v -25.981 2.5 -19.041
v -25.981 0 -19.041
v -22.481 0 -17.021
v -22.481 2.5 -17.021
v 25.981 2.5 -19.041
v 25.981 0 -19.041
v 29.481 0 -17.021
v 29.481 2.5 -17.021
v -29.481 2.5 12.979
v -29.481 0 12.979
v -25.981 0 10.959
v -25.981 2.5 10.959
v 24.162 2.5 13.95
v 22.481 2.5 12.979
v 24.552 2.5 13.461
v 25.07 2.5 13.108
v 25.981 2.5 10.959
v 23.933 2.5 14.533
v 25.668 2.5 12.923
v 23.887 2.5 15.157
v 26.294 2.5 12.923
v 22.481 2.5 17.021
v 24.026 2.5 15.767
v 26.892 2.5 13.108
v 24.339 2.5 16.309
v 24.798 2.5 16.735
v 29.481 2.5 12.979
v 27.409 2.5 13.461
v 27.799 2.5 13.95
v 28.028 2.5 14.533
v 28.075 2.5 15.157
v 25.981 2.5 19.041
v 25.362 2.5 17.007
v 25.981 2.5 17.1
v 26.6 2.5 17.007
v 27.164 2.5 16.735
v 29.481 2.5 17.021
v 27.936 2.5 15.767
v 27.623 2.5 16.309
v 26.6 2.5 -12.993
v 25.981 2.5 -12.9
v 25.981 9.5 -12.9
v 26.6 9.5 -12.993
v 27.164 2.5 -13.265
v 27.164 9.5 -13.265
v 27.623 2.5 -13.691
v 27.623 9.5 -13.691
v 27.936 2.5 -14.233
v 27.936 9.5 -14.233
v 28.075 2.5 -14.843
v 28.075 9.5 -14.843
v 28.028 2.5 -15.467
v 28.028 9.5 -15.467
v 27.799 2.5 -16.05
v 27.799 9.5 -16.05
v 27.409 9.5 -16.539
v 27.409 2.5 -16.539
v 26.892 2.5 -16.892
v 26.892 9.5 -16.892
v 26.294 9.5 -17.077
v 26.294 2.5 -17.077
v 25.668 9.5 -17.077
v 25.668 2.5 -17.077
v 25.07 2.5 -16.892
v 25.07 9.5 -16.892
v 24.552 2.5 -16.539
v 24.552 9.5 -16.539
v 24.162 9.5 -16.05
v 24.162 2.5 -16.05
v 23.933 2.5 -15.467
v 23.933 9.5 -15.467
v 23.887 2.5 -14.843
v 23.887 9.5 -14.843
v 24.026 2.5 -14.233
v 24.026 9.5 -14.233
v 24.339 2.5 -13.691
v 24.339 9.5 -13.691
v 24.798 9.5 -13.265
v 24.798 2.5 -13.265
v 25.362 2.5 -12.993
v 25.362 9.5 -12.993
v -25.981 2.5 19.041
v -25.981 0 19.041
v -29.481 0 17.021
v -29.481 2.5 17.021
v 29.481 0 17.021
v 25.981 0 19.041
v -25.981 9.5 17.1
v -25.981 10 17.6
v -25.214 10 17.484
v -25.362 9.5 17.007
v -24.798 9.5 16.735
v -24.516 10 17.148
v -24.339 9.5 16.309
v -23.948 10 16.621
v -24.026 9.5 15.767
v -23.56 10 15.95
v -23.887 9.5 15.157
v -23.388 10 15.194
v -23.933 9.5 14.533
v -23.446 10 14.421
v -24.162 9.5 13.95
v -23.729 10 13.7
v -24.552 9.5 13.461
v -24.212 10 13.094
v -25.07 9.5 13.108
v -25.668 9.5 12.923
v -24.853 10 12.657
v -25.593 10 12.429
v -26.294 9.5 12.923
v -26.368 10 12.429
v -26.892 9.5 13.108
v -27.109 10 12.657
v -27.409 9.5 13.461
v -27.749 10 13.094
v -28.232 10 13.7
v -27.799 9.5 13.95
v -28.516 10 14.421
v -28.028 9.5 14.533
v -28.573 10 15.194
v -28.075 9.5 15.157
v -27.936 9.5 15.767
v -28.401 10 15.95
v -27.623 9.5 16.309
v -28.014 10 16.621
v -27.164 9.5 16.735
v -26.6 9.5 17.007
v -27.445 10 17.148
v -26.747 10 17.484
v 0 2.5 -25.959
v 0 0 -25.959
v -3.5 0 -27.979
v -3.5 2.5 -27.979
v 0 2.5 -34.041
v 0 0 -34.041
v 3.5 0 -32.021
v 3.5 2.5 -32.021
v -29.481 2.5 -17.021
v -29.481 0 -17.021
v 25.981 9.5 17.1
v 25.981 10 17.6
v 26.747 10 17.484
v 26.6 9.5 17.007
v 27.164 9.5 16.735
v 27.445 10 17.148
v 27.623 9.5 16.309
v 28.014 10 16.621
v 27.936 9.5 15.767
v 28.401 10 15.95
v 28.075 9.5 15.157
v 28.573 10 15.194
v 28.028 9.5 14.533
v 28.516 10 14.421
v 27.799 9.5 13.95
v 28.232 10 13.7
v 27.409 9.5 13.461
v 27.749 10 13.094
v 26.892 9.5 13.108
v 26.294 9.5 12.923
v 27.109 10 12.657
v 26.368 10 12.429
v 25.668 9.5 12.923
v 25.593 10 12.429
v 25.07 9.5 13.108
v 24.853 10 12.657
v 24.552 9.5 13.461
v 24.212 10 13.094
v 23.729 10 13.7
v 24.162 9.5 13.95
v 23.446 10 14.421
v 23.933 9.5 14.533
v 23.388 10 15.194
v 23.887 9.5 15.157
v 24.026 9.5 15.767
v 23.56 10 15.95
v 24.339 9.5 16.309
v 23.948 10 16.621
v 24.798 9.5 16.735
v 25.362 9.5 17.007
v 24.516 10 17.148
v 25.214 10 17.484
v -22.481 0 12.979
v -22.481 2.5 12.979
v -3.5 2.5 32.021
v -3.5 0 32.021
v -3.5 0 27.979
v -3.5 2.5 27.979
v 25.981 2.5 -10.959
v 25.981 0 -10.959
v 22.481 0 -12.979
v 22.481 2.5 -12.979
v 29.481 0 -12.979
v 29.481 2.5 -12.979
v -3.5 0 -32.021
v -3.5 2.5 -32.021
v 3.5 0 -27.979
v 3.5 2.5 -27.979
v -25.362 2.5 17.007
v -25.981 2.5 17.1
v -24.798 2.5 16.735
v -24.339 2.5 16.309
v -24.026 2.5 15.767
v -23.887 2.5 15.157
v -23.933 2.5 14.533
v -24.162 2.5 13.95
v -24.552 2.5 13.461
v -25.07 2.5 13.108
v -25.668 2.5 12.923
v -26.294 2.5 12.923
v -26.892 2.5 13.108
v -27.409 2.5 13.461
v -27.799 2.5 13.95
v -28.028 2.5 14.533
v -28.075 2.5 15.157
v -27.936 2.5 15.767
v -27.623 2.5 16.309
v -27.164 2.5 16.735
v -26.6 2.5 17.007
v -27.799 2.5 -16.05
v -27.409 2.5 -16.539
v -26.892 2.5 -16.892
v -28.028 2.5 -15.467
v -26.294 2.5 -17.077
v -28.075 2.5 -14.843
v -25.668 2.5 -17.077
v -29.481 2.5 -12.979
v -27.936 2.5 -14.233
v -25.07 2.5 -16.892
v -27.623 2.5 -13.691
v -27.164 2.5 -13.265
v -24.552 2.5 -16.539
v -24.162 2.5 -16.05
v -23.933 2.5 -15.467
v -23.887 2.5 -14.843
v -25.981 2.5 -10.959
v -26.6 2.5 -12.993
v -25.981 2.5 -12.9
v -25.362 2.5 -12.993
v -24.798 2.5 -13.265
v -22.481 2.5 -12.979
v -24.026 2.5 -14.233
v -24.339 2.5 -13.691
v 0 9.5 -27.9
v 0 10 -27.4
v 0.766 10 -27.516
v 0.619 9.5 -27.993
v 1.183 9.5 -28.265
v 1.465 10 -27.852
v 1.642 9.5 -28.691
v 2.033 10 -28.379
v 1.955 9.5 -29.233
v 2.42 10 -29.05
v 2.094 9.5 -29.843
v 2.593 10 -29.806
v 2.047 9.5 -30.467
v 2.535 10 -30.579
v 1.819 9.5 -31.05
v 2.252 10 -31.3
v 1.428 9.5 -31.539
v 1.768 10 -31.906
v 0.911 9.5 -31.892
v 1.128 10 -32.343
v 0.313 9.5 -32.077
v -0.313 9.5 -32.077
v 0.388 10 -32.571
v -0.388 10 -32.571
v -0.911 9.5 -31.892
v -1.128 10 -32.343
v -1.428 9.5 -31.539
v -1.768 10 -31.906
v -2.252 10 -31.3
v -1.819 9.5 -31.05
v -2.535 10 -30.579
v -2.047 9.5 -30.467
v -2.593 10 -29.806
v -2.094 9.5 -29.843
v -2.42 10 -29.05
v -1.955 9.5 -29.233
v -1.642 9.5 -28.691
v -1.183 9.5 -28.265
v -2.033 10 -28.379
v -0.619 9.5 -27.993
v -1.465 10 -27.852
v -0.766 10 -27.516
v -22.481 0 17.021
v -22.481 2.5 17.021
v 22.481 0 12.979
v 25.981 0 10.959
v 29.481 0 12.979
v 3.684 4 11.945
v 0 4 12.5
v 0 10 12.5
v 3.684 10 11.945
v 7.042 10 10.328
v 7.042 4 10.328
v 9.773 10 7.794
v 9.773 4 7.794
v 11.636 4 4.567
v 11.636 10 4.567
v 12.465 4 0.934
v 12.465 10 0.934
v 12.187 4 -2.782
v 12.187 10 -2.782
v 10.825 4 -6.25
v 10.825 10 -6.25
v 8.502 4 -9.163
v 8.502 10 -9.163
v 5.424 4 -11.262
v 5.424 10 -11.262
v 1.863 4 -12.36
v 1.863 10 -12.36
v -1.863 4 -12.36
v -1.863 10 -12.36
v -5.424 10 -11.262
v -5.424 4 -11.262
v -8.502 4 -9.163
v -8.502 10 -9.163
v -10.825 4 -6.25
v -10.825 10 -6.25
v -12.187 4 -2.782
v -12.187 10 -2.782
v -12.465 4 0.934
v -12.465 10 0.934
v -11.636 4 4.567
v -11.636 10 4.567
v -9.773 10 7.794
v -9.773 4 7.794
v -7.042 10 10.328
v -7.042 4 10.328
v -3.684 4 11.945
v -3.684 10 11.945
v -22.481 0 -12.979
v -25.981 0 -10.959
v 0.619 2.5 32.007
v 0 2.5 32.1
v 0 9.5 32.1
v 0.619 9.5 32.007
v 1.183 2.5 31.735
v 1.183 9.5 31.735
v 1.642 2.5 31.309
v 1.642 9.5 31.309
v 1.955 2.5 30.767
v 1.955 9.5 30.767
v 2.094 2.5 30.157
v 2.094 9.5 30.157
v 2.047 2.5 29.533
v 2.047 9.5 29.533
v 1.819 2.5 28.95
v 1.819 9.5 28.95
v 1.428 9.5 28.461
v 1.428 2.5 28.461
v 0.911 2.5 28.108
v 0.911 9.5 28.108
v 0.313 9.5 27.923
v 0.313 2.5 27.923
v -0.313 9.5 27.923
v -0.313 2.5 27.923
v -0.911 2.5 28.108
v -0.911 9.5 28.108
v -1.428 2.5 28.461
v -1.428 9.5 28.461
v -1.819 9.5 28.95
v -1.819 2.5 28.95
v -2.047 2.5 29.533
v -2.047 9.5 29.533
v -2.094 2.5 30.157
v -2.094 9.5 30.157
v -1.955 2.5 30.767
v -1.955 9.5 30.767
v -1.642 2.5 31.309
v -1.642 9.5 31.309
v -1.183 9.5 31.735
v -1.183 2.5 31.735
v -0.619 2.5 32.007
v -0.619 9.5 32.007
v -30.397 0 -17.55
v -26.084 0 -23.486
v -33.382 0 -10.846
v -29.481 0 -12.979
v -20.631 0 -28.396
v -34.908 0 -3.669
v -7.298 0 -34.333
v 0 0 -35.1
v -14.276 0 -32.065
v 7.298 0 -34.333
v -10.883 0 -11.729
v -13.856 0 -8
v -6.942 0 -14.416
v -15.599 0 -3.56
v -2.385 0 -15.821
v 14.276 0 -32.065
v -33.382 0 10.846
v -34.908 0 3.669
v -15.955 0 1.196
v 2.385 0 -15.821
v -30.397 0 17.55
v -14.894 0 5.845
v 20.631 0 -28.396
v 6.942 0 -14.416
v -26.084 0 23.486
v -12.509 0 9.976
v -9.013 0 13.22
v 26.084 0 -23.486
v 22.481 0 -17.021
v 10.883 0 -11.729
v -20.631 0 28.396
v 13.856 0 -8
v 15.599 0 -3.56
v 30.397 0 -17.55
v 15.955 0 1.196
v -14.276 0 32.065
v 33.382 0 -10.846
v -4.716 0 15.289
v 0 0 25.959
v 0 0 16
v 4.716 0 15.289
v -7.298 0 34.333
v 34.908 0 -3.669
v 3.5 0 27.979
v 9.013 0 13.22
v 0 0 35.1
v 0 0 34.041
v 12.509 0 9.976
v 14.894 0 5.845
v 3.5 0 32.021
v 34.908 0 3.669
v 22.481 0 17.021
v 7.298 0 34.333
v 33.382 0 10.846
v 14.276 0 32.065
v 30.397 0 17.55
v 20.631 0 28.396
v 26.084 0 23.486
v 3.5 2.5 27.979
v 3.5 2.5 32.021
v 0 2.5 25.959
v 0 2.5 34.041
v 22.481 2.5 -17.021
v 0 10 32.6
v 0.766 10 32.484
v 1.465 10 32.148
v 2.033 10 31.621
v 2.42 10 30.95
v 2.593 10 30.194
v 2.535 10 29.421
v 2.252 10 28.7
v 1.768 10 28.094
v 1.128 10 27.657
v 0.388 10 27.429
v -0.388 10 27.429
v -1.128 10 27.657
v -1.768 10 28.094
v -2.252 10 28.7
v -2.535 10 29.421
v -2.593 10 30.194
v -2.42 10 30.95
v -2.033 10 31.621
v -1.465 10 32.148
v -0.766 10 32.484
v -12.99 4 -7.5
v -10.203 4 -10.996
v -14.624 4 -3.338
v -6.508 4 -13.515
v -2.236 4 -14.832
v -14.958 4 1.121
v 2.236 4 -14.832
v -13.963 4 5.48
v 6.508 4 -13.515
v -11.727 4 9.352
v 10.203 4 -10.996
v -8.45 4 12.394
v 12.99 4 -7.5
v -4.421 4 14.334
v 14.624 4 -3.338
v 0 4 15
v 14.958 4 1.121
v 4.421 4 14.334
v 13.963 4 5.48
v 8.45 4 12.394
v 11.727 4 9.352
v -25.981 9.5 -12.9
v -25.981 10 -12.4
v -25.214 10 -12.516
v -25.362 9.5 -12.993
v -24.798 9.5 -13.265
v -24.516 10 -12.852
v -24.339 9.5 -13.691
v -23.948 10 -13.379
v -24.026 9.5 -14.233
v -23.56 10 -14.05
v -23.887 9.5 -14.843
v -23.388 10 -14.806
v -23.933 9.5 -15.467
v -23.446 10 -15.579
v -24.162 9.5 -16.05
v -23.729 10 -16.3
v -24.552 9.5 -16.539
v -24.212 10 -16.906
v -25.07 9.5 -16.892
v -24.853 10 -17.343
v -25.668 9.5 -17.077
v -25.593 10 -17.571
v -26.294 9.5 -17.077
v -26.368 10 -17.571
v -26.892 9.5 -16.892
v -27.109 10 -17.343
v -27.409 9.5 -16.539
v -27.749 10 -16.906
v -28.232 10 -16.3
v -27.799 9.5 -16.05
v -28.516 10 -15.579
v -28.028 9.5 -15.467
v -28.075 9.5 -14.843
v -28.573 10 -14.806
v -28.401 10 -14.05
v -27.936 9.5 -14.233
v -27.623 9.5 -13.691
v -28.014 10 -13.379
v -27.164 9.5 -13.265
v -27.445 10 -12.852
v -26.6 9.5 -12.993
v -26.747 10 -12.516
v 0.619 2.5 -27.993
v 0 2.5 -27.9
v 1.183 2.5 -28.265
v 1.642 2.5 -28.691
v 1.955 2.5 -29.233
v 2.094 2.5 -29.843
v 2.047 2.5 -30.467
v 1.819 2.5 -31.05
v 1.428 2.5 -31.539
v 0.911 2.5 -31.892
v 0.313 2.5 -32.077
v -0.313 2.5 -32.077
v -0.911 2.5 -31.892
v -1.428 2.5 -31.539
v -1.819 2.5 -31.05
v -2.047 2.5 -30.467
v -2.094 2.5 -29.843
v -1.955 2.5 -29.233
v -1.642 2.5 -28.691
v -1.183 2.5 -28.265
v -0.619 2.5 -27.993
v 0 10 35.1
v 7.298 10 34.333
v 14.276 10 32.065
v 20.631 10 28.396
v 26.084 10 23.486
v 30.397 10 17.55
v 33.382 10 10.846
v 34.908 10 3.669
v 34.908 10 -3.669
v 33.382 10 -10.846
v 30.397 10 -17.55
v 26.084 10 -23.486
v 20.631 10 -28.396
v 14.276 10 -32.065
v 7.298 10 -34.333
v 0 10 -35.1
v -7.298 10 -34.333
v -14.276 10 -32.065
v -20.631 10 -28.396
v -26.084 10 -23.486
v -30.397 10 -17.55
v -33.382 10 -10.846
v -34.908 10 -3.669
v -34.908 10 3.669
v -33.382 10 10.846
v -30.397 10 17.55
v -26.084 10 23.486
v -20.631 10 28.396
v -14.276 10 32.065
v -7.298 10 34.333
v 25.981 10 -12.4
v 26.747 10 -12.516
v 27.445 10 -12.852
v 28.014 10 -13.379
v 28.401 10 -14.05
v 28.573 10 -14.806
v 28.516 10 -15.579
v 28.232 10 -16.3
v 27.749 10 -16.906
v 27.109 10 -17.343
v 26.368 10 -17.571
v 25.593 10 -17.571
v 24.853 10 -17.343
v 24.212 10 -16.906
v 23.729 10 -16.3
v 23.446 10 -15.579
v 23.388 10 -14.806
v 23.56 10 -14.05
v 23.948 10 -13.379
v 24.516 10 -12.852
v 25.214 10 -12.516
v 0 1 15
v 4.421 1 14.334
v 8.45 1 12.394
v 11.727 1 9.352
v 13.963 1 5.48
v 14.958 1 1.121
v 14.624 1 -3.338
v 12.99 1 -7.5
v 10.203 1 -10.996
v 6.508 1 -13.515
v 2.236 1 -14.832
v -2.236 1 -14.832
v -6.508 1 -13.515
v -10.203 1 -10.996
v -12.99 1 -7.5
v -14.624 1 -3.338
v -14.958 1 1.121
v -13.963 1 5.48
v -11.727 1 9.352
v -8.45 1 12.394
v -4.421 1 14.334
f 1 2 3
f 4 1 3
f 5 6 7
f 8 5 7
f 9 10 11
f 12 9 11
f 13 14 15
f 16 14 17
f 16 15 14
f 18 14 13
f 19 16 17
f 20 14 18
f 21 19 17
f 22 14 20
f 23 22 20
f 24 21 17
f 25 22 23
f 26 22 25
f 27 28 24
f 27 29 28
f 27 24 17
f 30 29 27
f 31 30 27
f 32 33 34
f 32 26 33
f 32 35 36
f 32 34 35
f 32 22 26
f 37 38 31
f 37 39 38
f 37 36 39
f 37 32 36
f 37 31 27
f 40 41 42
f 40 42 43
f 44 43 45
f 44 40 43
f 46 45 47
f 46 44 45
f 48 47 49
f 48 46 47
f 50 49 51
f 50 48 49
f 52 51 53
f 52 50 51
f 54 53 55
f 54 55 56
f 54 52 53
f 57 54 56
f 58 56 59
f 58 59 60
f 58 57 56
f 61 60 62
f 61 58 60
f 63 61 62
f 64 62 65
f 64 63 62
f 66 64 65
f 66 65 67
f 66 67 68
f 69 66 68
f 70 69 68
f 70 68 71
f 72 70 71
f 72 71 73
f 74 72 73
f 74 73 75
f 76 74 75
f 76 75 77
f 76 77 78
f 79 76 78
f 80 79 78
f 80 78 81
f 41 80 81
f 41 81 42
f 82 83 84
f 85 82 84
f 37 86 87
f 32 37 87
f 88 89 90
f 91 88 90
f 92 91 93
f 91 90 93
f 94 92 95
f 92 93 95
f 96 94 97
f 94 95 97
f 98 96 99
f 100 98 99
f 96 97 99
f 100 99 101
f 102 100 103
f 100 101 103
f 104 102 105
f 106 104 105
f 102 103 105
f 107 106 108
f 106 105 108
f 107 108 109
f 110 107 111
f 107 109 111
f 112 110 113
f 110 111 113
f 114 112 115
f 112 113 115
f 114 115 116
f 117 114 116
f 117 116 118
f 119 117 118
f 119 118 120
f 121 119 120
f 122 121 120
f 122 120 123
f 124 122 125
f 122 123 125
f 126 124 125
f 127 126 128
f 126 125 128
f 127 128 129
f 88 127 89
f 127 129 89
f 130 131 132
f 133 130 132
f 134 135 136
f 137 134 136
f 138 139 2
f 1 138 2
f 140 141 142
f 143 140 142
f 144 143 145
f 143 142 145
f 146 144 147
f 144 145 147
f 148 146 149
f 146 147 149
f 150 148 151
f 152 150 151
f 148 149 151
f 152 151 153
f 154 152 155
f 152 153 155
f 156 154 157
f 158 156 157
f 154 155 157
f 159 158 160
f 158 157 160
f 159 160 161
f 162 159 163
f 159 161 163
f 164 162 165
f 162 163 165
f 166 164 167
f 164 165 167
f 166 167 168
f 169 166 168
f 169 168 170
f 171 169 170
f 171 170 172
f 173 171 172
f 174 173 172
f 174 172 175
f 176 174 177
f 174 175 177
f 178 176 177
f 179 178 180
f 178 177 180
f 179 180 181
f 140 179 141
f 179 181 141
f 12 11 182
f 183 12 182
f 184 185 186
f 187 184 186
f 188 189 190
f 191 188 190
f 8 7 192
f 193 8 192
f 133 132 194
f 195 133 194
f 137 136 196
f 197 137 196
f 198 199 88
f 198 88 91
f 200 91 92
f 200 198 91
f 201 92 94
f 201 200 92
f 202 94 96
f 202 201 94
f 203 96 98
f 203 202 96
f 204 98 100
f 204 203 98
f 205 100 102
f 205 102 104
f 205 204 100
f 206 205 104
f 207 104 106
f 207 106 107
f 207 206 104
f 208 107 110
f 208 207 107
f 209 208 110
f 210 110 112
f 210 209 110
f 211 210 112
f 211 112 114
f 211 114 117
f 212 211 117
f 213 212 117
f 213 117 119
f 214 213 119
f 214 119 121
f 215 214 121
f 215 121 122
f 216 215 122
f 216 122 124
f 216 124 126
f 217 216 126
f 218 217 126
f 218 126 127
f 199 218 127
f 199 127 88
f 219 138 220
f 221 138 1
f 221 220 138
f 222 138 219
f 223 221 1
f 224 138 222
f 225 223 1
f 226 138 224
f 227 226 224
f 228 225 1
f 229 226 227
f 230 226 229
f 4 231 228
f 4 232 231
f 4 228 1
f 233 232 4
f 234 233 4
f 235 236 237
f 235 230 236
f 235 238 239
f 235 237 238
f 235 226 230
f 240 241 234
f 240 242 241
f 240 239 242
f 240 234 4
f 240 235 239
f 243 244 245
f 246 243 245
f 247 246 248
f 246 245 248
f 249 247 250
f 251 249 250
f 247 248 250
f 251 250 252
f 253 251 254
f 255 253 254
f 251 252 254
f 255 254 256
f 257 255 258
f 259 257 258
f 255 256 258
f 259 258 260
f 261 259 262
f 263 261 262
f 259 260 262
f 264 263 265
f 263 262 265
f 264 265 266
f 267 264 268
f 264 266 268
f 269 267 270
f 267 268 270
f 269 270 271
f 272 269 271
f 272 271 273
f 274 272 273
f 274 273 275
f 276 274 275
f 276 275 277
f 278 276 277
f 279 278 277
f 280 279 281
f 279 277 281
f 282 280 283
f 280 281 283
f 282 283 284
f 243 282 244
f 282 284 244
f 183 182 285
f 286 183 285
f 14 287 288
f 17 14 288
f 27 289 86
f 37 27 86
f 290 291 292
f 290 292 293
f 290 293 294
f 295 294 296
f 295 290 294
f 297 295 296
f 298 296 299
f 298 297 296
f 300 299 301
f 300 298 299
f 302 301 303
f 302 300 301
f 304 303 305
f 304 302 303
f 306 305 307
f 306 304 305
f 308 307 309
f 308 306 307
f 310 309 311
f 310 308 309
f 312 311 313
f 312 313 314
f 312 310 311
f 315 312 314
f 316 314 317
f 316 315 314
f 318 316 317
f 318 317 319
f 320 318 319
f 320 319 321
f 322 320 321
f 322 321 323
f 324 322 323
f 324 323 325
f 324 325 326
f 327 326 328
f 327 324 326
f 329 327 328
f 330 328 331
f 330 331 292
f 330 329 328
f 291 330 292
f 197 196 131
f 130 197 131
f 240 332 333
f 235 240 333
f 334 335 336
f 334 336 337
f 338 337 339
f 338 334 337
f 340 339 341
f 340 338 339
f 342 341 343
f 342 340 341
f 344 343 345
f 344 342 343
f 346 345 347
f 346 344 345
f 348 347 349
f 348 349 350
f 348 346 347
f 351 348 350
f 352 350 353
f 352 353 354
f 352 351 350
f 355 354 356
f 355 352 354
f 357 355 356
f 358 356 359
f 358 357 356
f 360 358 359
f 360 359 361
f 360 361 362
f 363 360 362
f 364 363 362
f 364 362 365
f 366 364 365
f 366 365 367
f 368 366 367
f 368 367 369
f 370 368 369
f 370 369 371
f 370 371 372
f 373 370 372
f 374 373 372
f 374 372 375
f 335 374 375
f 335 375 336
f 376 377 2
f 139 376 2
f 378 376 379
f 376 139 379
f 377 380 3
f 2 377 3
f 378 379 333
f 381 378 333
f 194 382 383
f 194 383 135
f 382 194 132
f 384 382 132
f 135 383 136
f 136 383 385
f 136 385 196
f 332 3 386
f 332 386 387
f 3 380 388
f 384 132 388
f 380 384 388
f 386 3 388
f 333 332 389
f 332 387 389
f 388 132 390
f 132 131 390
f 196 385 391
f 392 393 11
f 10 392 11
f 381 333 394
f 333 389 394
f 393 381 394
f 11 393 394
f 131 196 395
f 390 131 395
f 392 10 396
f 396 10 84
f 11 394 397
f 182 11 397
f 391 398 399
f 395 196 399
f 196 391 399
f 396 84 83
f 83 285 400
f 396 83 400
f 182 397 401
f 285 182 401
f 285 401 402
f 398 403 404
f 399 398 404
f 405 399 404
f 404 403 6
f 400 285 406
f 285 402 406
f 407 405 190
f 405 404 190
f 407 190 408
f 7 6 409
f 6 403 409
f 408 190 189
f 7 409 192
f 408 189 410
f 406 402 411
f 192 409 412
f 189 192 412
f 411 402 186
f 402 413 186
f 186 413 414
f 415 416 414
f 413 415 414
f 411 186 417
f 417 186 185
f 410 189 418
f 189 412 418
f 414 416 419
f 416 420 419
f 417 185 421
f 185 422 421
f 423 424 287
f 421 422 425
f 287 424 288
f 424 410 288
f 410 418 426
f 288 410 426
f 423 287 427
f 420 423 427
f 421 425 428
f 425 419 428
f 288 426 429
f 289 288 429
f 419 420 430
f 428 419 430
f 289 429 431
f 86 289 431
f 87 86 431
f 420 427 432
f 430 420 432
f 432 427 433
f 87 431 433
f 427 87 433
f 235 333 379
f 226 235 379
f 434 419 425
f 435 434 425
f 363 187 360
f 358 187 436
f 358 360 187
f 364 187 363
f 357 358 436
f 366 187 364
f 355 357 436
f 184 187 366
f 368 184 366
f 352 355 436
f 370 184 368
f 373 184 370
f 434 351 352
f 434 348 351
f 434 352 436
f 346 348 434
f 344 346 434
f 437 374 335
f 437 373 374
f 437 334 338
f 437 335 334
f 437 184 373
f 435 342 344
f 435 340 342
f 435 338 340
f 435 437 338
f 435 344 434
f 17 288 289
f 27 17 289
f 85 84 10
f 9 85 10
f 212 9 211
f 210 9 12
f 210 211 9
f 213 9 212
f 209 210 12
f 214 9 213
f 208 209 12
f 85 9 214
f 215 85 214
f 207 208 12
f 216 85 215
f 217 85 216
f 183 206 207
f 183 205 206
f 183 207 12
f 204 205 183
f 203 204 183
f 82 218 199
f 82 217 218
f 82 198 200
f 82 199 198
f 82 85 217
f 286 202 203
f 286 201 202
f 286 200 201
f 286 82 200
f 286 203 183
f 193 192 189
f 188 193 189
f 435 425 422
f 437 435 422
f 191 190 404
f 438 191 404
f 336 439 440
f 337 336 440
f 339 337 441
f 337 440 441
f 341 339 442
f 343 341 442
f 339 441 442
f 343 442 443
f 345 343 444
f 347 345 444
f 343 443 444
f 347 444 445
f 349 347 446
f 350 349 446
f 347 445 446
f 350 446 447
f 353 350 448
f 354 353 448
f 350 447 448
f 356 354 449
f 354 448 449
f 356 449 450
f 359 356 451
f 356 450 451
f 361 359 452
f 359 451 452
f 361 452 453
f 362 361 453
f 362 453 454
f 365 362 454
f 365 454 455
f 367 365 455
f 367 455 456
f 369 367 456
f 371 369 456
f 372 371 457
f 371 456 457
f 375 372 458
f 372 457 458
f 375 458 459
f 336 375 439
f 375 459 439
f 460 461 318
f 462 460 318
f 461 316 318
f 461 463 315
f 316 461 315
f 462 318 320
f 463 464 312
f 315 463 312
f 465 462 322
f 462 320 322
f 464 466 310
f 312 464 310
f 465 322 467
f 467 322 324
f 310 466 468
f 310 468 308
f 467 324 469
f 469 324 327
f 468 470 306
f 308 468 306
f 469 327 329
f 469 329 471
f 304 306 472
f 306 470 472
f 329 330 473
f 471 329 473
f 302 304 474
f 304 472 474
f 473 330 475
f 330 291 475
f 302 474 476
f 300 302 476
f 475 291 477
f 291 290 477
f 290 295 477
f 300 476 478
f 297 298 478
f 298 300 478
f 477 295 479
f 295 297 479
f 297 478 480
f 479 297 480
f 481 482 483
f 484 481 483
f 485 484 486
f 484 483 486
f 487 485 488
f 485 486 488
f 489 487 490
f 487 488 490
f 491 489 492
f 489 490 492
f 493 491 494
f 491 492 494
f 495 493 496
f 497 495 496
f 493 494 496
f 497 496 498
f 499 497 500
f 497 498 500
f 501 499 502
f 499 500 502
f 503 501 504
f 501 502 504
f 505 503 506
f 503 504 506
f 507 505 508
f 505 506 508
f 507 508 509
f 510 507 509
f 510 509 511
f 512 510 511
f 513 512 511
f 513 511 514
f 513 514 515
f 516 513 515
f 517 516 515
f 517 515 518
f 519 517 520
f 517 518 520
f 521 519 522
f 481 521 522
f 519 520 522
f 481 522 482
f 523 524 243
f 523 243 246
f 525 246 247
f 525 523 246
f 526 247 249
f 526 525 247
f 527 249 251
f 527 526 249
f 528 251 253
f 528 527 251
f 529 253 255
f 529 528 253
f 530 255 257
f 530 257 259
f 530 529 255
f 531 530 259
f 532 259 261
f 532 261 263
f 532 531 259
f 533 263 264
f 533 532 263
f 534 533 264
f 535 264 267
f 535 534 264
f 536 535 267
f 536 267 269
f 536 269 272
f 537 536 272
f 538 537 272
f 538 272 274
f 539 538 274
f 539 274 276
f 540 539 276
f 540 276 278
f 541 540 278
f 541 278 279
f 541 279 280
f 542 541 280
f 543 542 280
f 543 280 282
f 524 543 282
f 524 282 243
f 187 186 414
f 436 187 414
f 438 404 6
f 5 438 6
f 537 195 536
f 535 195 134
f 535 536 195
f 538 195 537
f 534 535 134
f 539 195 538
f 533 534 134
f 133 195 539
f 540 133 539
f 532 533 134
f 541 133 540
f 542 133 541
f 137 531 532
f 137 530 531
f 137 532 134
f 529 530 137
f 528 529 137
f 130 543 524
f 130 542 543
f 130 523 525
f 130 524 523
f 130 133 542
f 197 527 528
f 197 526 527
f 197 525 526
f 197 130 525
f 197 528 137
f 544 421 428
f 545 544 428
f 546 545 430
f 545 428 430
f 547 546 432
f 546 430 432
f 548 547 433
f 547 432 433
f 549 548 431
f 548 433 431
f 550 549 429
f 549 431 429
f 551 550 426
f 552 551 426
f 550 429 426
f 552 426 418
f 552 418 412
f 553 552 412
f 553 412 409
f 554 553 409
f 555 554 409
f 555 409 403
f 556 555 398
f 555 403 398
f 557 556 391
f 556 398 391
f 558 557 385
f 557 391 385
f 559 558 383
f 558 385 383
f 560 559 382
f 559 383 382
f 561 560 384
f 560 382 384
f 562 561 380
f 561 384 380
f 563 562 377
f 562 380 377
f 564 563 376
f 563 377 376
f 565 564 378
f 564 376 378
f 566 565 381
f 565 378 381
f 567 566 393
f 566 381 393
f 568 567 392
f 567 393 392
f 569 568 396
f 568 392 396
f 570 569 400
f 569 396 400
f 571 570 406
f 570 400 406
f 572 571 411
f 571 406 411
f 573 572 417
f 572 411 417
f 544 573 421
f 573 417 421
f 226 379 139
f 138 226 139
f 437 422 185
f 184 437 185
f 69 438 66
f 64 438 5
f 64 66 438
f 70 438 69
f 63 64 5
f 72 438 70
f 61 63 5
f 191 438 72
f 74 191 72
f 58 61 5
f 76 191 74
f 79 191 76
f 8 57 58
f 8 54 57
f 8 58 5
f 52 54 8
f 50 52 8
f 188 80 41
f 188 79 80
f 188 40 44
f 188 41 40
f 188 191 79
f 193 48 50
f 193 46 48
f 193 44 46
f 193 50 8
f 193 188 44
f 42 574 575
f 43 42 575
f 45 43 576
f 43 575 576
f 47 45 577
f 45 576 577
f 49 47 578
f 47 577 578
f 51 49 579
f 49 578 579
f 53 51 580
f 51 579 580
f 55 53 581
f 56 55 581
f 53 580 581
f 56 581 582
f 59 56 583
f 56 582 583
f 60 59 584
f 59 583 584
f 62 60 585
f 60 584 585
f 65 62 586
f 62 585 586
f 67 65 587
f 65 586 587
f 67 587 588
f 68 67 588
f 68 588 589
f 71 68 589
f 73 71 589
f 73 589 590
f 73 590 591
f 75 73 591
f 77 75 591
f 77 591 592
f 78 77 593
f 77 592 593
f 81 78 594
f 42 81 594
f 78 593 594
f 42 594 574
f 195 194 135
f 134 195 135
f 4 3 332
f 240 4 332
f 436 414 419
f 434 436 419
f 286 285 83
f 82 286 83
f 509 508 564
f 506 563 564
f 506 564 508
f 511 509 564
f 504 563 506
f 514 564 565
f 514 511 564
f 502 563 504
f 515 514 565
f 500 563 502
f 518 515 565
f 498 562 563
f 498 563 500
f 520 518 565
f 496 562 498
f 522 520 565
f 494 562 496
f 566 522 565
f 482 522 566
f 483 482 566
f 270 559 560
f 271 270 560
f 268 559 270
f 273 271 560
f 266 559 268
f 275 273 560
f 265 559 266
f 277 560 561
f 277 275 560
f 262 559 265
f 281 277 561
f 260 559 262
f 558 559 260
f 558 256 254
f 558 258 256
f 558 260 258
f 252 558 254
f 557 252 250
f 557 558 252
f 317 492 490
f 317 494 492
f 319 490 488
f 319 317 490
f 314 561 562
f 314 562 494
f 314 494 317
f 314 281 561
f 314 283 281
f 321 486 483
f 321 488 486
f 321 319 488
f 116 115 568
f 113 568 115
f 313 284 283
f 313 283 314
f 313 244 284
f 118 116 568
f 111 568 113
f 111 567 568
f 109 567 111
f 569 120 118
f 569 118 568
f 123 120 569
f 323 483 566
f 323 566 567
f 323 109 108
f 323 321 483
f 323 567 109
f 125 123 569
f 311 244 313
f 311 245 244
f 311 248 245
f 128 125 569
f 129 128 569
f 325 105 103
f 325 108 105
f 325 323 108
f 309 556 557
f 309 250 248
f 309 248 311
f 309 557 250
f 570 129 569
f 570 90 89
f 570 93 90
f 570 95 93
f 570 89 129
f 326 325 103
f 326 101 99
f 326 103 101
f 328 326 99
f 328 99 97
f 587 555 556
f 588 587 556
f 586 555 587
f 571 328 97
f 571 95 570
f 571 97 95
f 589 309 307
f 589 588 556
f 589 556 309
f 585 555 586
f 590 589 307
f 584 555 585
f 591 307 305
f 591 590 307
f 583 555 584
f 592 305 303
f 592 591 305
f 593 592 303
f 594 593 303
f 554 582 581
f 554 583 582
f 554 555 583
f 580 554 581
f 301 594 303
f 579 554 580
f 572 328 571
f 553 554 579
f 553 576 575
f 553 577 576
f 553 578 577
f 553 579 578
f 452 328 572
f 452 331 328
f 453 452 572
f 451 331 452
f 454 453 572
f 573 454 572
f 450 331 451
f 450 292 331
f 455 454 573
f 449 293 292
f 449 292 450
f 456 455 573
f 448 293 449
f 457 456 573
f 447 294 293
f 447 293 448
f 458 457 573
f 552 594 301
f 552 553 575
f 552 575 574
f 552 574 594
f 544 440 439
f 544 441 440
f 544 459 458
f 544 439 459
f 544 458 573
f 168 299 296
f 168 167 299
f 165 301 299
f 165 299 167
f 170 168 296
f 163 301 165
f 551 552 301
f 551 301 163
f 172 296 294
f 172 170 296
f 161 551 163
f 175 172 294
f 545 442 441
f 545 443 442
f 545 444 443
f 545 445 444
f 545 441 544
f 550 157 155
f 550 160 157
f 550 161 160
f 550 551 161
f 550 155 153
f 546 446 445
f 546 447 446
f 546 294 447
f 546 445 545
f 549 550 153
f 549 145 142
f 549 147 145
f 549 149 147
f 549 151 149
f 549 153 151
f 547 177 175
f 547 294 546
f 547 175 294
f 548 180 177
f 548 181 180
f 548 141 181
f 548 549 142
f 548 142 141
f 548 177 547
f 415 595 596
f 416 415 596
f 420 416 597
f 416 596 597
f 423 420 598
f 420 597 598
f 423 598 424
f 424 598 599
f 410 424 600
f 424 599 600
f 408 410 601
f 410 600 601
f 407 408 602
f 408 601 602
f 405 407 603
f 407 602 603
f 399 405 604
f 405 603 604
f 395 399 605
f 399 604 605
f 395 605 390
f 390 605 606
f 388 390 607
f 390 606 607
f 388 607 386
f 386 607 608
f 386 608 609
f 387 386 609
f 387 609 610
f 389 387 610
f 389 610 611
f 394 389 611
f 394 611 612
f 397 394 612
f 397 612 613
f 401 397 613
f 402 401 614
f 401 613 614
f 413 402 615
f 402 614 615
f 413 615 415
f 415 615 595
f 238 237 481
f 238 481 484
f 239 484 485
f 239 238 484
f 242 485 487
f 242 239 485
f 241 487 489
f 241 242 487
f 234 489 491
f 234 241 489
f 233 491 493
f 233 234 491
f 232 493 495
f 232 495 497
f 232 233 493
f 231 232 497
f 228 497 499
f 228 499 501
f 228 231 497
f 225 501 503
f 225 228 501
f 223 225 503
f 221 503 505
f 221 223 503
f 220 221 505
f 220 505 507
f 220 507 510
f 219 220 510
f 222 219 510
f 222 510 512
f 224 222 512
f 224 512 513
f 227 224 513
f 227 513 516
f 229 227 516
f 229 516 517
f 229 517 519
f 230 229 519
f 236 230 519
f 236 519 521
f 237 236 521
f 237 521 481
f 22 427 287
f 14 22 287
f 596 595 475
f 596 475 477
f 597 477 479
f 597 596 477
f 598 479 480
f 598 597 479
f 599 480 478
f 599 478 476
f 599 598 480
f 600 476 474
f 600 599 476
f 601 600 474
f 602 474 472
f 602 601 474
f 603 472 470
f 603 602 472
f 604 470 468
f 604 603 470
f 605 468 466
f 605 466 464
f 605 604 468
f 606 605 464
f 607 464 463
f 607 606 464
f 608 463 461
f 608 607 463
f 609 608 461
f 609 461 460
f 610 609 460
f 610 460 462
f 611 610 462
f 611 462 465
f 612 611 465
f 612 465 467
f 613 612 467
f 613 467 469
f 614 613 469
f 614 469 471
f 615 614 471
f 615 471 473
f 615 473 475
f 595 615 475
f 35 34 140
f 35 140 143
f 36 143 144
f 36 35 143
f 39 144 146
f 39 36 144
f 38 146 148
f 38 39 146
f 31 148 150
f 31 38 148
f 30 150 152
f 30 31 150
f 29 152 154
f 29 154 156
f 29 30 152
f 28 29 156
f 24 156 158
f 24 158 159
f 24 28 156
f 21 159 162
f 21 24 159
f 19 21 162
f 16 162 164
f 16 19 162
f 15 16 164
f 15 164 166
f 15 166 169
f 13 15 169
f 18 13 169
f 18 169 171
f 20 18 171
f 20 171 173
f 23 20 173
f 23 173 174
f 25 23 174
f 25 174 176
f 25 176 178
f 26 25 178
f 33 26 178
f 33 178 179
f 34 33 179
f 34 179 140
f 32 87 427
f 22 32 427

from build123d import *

# Parameters (mm, degrees)
SKETCH1_R           = 35.1
SKETCH1_R_2         = 2.1
SKETCH1_R_3         = 15
MAIN_BODY_DEPTH     = 10
CHAMFER3_SIZE       = 0.5
CHAMFER4_SIZE       = 1
BOSS_EXTRUDE4_START = -6
SKETCH2_R           = 15
SKETCH2_R_2         = 12.5
BOSS_EXTRUDE4_DEPTH = 6
CUT_EXTRUDE1_DEPTH  = 2.5


with BuildPart() as part:
    # Sketch1 → Main Body (new body)
    with BuildSketch(Plane(origin=(0, 0, 0), x_dir=(1, 0, 0), z_dir=(0, 1, 0))):
        with Locations(Location((0, 0, 0), (0, 0, 270))):
            Circle(SKETCH1_R)
        with Locations(Location((0, 30, 0), (0, 0, 270))):
            Circle(SKETCH1_R_2, mode=Mode.SUBTRACT)
        with Locations(Location((25.980762114, 15, 0), (0, 0, 270))):
            Circle(SKETCH1_R_2, mode=Mode.SUBTRACT)
        with Locations(Location((25.980762114, -15, 0), (0, 0, 270))):
            Circle(SKETCH1_R_2, mode=Mode.SUBTRACT)
        with Locations(Location((0, -30, 0), (0, 0, 270))):
            Circle(SKETCH1_R_2, mode=Mode.SUBTRACT)
        with Locations(Location((-25.980762114, -15, 0), (0, 0, 270))):
            Circle(SKETCH1_R_2, mode=Mode.SUBTRACT)
        with Locations(Location((-25.980762114, 15, 0), (0, 0, 270))):
            Circle(SKETCH1_R_2, mode=Mode.SUBTRACT)
        with Locations(Location((0, 0, 0), (0, 0, 270))):
            Circle(SKETCH1_R_3, mode=Mode.SUBTRACT)
    extrude(amount=MAIN_BODY_DEPTH)

    # Chamfer3
    chamfer3_edges = [part.edges().sort_by_distance(p)[0] for p in [
        (25.980762114, 10, -17.1),
        (25.980762114, 10, 12.9),
        (0, 10, 27.9),
        (-25.980762114, 10, 12.9),
        (-25.980762114, 10, -17.1),
        (0, 10, -32.1),
    ]]
    chamfer(chamfer3_edges, length=CHAMFER3_SIZE)

    # Chamfer4
    chamfer4_edges = [part.edges().sort_by_distance(p)[0] for p in [
        (0, 0, -15),
    ]]
    chamfer(chamfer4_edges, length=CHAMFER4_SIZE)

    # Sketch2 → Boss-Extrude4 (add)
    with BuildSketch(Plane(origin=(0, 10, 0), x_dir=(1, 0, 0), z_dir=(0, 1, 0)).offset(BOSS_EXTRUDE4_START)):
        with Locations(Location((0, 0, 0), (0, 0, 270))):
            Circle(SKETCH2_R)
        with Locations(Location((0, 0, 0), (0, 0, 270))):
            Circle(SKETCH2_R_2, mode=Mode.SUBTRACT)
    extrude(amount=BOSS_EXTRUDE4_DEPTH)

    # Sketch3 → Cut-Extrude1 (cut)
    with BuildSketch(Plane.XZ):
        Polygon((25.980762114, 10.958548116), (29.480762114, 12.979274058), (29.480762114, 17.020725942), (25.980762114, 19.041451884), (22.480762114, 17.020725942), (22.480762114, 12.979274058), align=None)
        Polygon((0, 25.958548116), (3.5, 27.979274058), (3.5, 32.020725942), (0, 34.041451884), (-3.5, 32.020725942), (-3.5, 27.979274058), align=None)
        Polygon((22.480762114, -17.020725942), (25.980762114, -19.041451884), (29.480762114, -17.020725942), (29.480762114, -12.979274058), (25.980762114, -10.958548116), (22.480762114, -12.979274058), align=None)
        Polygon((-3.5, -27.979274058), (-3.5, -32.020725942), (0, -34.041451884), (3.5, -32.020725942), (3.5, -27.979274058), (0, -25.958548116), align=None)
        Polygon((-25.980762114, -10.958548116), (-29.480762114, -12.979274058), (-29.480762114, -17.020725942), (-25.980762114, -19.041451884), (-22.480762114, -17.020725942), (-22.480762114, -12.979274058), align=None)
        Polygon((-22.480762114, 17.020725942), (-25.980762114, 19.041451884), (-29.480762114, 17.020725942), (-29.480762114, 12.979274058), (-25.980762114, 10.958548116), (-22.480762114, 12.979274058), align=None)
    extrude(amount=-CUT_EXTRUDE1_DEPTH, mode=Mode.SUBTRACT)


solid = part.part
